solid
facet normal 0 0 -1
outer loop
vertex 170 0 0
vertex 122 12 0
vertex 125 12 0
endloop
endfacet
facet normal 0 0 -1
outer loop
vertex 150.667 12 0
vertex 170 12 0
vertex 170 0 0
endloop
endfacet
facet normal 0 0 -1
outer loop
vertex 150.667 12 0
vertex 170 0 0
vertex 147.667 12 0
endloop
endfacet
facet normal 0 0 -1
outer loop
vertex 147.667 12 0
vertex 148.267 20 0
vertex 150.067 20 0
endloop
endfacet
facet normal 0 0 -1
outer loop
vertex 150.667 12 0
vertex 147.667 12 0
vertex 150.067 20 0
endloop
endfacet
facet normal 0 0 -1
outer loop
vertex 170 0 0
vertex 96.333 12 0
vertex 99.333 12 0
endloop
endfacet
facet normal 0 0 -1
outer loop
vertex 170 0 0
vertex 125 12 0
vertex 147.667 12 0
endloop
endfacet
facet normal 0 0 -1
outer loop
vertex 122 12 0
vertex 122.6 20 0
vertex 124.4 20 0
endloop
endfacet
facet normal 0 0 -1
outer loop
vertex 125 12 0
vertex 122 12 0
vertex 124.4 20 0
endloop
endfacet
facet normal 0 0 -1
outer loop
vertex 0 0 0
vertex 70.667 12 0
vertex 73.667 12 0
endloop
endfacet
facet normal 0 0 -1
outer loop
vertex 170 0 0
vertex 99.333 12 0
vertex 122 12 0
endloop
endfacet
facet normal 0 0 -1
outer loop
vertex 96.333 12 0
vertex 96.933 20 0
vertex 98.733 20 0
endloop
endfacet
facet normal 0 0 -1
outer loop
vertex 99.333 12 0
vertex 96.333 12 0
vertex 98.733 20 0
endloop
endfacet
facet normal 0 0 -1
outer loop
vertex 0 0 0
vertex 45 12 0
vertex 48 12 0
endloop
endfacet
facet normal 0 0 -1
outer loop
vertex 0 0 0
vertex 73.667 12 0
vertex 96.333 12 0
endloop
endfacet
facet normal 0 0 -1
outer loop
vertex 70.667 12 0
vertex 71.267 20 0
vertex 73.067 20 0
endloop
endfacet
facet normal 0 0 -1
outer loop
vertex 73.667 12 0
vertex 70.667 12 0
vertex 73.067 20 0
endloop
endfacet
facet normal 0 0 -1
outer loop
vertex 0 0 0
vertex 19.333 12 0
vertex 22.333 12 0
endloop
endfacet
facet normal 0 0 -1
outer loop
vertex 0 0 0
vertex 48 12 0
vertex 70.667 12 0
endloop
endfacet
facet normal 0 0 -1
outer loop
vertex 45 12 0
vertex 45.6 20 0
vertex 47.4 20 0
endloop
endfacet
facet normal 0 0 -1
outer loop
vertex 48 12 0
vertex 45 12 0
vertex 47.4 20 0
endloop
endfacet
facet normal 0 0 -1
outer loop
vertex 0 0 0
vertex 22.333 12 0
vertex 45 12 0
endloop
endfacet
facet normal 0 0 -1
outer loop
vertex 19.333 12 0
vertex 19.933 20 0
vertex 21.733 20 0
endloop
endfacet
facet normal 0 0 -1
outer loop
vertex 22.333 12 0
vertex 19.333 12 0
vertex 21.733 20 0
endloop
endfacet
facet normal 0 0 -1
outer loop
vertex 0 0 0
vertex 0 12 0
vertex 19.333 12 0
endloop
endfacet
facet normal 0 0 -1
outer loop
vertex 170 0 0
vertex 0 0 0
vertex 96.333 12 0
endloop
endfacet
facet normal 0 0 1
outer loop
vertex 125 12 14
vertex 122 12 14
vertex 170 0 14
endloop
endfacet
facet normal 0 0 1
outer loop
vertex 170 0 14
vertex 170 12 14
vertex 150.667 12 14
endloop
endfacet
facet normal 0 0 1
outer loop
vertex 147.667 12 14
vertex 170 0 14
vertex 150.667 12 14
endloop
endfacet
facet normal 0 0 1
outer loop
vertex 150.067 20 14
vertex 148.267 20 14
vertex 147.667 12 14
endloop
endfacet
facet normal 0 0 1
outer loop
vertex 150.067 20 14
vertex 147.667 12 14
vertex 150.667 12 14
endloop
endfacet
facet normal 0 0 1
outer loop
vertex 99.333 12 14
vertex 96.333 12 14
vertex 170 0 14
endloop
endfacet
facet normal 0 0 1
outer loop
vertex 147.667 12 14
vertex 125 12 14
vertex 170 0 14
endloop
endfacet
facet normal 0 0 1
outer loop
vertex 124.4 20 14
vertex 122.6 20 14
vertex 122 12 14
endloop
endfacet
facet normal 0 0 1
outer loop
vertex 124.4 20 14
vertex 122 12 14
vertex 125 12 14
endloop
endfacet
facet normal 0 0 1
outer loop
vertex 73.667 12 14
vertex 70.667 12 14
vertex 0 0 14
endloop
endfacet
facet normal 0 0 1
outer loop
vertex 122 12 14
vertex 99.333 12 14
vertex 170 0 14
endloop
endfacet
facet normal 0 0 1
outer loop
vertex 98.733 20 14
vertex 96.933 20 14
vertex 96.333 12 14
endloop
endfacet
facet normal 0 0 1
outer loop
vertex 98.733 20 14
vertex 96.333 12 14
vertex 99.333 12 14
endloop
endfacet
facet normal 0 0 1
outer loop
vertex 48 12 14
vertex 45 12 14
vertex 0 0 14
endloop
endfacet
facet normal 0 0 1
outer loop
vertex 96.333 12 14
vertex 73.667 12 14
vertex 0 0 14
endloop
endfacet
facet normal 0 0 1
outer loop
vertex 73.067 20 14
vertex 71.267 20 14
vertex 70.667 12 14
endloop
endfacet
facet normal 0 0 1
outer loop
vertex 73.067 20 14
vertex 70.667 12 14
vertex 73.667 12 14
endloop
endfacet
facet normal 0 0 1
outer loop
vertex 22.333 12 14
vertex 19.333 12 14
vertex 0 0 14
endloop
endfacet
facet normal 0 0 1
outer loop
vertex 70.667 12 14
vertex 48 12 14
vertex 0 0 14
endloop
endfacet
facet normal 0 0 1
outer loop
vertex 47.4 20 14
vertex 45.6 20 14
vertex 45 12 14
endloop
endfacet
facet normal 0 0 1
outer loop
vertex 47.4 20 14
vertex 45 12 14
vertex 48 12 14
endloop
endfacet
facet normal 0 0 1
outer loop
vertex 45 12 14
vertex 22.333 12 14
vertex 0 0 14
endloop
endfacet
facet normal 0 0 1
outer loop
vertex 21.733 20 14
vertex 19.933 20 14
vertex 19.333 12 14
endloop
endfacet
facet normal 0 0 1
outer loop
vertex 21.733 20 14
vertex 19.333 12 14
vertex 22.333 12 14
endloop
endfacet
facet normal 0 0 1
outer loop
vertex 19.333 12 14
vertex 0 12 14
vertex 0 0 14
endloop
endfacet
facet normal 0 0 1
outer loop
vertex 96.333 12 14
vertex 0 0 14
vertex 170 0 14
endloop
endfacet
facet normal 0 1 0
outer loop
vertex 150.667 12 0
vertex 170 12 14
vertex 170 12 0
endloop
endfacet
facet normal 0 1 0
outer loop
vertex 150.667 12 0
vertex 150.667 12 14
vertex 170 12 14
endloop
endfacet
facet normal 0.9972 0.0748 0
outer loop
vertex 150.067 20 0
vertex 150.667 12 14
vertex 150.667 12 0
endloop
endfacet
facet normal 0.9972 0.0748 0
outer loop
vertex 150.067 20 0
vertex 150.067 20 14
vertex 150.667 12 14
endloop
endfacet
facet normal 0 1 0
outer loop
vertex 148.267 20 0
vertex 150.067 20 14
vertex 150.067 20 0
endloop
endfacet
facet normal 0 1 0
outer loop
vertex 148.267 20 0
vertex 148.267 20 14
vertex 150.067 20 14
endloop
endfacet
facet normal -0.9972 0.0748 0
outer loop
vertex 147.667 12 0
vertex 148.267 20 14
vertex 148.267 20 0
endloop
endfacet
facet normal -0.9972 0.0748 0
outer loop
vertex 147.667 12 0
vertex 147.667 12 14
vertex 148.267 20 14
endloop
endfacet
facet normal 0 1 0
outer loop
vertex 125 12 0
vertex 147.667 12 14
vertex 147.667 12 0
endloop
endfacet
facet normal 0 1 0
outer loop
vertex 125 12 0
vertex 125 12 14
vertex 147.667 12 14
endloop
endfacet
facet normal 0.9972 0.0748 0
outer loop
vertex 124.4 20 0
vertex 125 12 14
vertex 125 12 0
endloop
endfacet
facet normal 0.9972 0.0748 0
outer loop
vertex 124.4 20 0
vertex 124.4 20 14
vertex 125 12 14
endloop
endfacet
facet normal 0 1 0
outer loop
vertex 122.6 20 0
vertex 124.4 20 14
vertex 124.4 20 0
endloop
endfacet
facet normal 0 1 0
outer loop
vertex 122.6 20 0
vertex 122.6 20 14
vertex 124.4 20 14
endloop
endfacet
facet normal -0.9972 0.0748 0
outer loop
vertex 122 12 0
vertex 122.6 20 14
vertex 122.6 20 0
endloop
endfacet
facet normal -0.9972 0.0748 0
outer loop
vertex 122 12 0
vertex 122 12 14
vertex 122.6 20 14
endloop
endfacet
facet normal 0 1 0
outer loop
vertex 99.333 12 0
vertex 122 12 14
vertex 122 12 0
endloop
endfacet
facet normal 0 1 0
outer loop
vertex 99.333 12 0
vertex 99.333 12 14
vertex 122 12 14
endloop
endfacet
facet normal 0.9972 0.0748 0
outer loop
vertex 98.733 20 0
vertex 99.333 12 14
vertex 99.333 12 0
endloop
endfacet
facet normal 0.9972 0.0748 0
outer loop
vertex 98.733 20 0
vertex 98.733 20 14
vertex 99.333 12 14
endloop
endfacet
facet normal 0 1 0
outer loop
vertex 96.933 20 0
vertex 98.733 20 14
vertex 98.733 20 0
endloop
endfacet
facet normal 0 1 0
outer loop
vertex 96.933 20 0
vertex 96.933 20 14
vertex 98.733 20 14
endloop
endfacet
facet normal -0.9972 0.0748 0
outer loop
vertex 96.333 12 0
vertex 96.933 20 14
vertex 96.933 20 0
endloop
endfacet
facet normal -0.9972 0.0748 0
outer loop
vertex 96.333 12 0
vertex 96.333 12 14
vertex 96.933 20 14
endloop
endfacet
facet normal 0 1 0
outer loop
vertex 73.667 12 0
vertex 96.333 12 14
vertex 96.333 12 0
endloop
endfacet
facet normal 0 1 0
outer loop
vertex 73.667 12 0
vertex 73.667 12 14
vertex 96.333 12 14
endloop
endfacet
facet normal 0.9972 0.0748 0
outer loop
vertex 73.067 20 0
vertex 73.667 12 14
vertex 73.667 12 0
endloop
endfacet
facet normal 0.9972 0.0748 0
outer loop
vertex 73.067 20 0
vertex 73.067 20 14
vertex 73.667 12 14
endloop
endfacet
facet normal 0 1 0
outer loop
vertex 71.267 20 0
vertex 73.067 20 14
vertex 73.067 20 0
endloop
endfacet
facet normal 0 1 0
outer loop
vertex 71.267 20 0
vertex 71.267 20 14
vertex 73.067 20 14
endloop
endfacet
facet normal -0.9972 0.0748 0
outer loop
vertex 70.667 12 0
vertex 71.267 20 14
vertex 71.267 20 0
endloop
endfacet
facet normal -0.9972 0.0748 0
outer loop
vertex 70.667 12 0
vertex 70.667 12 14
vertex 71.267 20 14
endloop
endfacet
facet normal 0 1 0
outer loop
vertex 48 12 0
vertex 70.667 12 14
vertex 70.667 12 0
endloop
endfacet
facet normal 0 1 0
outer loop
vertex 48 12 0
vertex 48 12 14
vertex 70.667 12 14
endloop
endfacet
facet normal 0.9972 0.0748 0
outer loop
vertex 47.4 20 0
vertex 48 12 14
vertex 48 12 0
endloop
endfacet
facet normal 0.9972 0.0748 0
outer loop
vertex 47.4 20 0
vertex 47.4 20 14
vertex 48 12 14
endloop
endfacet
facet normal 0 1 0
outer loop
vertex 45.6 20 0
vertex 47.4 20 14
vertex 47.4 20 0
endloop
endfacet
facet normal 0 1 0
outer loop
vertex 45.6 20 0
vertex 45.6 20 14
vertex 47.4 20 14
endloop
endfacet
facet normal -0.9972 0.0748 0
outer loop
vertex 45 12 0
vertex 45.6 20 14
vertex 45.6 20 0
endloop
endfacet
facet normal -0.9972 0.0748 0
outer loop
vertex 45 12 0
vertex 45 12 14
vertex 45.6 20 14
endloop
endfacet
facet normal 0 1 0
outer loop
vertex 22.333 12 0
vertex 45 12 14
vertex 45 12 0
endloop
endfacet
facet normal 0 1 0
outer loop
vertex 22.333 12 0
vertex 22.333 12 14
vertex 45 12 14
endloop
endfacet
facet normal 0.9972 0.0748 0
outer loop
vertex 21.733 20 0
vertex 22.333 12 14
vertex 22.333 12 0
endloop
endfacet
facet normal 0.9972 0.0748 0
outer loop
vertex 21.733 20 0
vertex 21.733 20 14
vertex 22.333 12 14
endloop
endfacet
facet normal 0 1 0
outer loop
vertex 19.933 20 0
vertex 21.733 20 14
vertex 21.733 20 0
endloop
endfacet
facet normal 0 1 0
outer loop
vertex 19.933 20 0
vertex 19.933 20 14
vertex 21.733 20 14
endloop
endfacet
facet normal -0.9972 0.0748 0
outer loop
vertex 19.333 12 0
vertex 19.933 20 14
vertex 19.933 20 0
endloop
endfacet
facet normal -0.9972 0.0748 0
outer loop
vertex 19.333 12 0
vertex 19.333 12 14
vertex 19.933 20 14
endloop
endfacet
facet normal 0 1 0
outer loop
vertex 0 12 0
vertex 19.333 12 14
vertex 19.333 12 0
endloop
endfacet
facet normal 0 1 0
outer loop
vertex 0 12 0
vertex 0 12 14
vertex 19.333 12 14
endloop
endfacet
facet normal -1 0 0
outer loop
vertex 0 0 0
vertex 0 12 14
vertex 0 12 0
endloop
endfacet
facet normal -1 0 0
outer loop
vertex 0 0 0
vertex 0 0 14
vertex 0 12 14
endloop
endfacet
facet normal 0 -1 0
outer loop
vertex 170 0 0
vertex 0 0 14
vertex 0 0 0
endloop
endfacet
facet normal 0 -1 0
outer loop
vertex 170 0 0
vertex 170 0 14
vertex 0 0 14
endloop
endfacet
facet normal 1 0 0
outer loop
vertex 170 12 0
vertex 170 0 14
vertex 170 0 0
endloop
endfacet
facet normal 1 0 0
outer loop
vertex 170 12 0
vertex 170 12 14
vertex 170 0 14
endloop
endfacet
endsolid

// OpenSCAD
$fn = 32;

// ----------------------------------------------------------------------
// Gear rack: 6 teeth on a 170 mm bar, pitch 25.67 mm
// ----------------------------------------------------------------------

// --- parameters (mm) ---
profile_height = 14;      // extrusion height
profile_points = 28;      // points of the closed outline

profile = [[0, 0], [170, 0], [170, 12], [150.667, 12], [150.067, 20], [148.267, 20], [147.667, 12], [125, 12], [124.4, 20], [122.6, 20], [122, 12], [99.333, 12], [98.733, 20], [96.933, 20], [96.333, 12], [73.667, 12], [73.067, 20], [71.267, 20], [70.667, 12], [48, 12], [47.4, 20], [45.6, 20], [45, 12], [22.333, 12], [21.733, 20], [19.933, 20], [19.333, 12], [0, 12]];  // single closed polygon, 28 points, counter clockwise

// --- the one profile operation ---
linear_extrude(height = profile_height) polygon(points = profile);
